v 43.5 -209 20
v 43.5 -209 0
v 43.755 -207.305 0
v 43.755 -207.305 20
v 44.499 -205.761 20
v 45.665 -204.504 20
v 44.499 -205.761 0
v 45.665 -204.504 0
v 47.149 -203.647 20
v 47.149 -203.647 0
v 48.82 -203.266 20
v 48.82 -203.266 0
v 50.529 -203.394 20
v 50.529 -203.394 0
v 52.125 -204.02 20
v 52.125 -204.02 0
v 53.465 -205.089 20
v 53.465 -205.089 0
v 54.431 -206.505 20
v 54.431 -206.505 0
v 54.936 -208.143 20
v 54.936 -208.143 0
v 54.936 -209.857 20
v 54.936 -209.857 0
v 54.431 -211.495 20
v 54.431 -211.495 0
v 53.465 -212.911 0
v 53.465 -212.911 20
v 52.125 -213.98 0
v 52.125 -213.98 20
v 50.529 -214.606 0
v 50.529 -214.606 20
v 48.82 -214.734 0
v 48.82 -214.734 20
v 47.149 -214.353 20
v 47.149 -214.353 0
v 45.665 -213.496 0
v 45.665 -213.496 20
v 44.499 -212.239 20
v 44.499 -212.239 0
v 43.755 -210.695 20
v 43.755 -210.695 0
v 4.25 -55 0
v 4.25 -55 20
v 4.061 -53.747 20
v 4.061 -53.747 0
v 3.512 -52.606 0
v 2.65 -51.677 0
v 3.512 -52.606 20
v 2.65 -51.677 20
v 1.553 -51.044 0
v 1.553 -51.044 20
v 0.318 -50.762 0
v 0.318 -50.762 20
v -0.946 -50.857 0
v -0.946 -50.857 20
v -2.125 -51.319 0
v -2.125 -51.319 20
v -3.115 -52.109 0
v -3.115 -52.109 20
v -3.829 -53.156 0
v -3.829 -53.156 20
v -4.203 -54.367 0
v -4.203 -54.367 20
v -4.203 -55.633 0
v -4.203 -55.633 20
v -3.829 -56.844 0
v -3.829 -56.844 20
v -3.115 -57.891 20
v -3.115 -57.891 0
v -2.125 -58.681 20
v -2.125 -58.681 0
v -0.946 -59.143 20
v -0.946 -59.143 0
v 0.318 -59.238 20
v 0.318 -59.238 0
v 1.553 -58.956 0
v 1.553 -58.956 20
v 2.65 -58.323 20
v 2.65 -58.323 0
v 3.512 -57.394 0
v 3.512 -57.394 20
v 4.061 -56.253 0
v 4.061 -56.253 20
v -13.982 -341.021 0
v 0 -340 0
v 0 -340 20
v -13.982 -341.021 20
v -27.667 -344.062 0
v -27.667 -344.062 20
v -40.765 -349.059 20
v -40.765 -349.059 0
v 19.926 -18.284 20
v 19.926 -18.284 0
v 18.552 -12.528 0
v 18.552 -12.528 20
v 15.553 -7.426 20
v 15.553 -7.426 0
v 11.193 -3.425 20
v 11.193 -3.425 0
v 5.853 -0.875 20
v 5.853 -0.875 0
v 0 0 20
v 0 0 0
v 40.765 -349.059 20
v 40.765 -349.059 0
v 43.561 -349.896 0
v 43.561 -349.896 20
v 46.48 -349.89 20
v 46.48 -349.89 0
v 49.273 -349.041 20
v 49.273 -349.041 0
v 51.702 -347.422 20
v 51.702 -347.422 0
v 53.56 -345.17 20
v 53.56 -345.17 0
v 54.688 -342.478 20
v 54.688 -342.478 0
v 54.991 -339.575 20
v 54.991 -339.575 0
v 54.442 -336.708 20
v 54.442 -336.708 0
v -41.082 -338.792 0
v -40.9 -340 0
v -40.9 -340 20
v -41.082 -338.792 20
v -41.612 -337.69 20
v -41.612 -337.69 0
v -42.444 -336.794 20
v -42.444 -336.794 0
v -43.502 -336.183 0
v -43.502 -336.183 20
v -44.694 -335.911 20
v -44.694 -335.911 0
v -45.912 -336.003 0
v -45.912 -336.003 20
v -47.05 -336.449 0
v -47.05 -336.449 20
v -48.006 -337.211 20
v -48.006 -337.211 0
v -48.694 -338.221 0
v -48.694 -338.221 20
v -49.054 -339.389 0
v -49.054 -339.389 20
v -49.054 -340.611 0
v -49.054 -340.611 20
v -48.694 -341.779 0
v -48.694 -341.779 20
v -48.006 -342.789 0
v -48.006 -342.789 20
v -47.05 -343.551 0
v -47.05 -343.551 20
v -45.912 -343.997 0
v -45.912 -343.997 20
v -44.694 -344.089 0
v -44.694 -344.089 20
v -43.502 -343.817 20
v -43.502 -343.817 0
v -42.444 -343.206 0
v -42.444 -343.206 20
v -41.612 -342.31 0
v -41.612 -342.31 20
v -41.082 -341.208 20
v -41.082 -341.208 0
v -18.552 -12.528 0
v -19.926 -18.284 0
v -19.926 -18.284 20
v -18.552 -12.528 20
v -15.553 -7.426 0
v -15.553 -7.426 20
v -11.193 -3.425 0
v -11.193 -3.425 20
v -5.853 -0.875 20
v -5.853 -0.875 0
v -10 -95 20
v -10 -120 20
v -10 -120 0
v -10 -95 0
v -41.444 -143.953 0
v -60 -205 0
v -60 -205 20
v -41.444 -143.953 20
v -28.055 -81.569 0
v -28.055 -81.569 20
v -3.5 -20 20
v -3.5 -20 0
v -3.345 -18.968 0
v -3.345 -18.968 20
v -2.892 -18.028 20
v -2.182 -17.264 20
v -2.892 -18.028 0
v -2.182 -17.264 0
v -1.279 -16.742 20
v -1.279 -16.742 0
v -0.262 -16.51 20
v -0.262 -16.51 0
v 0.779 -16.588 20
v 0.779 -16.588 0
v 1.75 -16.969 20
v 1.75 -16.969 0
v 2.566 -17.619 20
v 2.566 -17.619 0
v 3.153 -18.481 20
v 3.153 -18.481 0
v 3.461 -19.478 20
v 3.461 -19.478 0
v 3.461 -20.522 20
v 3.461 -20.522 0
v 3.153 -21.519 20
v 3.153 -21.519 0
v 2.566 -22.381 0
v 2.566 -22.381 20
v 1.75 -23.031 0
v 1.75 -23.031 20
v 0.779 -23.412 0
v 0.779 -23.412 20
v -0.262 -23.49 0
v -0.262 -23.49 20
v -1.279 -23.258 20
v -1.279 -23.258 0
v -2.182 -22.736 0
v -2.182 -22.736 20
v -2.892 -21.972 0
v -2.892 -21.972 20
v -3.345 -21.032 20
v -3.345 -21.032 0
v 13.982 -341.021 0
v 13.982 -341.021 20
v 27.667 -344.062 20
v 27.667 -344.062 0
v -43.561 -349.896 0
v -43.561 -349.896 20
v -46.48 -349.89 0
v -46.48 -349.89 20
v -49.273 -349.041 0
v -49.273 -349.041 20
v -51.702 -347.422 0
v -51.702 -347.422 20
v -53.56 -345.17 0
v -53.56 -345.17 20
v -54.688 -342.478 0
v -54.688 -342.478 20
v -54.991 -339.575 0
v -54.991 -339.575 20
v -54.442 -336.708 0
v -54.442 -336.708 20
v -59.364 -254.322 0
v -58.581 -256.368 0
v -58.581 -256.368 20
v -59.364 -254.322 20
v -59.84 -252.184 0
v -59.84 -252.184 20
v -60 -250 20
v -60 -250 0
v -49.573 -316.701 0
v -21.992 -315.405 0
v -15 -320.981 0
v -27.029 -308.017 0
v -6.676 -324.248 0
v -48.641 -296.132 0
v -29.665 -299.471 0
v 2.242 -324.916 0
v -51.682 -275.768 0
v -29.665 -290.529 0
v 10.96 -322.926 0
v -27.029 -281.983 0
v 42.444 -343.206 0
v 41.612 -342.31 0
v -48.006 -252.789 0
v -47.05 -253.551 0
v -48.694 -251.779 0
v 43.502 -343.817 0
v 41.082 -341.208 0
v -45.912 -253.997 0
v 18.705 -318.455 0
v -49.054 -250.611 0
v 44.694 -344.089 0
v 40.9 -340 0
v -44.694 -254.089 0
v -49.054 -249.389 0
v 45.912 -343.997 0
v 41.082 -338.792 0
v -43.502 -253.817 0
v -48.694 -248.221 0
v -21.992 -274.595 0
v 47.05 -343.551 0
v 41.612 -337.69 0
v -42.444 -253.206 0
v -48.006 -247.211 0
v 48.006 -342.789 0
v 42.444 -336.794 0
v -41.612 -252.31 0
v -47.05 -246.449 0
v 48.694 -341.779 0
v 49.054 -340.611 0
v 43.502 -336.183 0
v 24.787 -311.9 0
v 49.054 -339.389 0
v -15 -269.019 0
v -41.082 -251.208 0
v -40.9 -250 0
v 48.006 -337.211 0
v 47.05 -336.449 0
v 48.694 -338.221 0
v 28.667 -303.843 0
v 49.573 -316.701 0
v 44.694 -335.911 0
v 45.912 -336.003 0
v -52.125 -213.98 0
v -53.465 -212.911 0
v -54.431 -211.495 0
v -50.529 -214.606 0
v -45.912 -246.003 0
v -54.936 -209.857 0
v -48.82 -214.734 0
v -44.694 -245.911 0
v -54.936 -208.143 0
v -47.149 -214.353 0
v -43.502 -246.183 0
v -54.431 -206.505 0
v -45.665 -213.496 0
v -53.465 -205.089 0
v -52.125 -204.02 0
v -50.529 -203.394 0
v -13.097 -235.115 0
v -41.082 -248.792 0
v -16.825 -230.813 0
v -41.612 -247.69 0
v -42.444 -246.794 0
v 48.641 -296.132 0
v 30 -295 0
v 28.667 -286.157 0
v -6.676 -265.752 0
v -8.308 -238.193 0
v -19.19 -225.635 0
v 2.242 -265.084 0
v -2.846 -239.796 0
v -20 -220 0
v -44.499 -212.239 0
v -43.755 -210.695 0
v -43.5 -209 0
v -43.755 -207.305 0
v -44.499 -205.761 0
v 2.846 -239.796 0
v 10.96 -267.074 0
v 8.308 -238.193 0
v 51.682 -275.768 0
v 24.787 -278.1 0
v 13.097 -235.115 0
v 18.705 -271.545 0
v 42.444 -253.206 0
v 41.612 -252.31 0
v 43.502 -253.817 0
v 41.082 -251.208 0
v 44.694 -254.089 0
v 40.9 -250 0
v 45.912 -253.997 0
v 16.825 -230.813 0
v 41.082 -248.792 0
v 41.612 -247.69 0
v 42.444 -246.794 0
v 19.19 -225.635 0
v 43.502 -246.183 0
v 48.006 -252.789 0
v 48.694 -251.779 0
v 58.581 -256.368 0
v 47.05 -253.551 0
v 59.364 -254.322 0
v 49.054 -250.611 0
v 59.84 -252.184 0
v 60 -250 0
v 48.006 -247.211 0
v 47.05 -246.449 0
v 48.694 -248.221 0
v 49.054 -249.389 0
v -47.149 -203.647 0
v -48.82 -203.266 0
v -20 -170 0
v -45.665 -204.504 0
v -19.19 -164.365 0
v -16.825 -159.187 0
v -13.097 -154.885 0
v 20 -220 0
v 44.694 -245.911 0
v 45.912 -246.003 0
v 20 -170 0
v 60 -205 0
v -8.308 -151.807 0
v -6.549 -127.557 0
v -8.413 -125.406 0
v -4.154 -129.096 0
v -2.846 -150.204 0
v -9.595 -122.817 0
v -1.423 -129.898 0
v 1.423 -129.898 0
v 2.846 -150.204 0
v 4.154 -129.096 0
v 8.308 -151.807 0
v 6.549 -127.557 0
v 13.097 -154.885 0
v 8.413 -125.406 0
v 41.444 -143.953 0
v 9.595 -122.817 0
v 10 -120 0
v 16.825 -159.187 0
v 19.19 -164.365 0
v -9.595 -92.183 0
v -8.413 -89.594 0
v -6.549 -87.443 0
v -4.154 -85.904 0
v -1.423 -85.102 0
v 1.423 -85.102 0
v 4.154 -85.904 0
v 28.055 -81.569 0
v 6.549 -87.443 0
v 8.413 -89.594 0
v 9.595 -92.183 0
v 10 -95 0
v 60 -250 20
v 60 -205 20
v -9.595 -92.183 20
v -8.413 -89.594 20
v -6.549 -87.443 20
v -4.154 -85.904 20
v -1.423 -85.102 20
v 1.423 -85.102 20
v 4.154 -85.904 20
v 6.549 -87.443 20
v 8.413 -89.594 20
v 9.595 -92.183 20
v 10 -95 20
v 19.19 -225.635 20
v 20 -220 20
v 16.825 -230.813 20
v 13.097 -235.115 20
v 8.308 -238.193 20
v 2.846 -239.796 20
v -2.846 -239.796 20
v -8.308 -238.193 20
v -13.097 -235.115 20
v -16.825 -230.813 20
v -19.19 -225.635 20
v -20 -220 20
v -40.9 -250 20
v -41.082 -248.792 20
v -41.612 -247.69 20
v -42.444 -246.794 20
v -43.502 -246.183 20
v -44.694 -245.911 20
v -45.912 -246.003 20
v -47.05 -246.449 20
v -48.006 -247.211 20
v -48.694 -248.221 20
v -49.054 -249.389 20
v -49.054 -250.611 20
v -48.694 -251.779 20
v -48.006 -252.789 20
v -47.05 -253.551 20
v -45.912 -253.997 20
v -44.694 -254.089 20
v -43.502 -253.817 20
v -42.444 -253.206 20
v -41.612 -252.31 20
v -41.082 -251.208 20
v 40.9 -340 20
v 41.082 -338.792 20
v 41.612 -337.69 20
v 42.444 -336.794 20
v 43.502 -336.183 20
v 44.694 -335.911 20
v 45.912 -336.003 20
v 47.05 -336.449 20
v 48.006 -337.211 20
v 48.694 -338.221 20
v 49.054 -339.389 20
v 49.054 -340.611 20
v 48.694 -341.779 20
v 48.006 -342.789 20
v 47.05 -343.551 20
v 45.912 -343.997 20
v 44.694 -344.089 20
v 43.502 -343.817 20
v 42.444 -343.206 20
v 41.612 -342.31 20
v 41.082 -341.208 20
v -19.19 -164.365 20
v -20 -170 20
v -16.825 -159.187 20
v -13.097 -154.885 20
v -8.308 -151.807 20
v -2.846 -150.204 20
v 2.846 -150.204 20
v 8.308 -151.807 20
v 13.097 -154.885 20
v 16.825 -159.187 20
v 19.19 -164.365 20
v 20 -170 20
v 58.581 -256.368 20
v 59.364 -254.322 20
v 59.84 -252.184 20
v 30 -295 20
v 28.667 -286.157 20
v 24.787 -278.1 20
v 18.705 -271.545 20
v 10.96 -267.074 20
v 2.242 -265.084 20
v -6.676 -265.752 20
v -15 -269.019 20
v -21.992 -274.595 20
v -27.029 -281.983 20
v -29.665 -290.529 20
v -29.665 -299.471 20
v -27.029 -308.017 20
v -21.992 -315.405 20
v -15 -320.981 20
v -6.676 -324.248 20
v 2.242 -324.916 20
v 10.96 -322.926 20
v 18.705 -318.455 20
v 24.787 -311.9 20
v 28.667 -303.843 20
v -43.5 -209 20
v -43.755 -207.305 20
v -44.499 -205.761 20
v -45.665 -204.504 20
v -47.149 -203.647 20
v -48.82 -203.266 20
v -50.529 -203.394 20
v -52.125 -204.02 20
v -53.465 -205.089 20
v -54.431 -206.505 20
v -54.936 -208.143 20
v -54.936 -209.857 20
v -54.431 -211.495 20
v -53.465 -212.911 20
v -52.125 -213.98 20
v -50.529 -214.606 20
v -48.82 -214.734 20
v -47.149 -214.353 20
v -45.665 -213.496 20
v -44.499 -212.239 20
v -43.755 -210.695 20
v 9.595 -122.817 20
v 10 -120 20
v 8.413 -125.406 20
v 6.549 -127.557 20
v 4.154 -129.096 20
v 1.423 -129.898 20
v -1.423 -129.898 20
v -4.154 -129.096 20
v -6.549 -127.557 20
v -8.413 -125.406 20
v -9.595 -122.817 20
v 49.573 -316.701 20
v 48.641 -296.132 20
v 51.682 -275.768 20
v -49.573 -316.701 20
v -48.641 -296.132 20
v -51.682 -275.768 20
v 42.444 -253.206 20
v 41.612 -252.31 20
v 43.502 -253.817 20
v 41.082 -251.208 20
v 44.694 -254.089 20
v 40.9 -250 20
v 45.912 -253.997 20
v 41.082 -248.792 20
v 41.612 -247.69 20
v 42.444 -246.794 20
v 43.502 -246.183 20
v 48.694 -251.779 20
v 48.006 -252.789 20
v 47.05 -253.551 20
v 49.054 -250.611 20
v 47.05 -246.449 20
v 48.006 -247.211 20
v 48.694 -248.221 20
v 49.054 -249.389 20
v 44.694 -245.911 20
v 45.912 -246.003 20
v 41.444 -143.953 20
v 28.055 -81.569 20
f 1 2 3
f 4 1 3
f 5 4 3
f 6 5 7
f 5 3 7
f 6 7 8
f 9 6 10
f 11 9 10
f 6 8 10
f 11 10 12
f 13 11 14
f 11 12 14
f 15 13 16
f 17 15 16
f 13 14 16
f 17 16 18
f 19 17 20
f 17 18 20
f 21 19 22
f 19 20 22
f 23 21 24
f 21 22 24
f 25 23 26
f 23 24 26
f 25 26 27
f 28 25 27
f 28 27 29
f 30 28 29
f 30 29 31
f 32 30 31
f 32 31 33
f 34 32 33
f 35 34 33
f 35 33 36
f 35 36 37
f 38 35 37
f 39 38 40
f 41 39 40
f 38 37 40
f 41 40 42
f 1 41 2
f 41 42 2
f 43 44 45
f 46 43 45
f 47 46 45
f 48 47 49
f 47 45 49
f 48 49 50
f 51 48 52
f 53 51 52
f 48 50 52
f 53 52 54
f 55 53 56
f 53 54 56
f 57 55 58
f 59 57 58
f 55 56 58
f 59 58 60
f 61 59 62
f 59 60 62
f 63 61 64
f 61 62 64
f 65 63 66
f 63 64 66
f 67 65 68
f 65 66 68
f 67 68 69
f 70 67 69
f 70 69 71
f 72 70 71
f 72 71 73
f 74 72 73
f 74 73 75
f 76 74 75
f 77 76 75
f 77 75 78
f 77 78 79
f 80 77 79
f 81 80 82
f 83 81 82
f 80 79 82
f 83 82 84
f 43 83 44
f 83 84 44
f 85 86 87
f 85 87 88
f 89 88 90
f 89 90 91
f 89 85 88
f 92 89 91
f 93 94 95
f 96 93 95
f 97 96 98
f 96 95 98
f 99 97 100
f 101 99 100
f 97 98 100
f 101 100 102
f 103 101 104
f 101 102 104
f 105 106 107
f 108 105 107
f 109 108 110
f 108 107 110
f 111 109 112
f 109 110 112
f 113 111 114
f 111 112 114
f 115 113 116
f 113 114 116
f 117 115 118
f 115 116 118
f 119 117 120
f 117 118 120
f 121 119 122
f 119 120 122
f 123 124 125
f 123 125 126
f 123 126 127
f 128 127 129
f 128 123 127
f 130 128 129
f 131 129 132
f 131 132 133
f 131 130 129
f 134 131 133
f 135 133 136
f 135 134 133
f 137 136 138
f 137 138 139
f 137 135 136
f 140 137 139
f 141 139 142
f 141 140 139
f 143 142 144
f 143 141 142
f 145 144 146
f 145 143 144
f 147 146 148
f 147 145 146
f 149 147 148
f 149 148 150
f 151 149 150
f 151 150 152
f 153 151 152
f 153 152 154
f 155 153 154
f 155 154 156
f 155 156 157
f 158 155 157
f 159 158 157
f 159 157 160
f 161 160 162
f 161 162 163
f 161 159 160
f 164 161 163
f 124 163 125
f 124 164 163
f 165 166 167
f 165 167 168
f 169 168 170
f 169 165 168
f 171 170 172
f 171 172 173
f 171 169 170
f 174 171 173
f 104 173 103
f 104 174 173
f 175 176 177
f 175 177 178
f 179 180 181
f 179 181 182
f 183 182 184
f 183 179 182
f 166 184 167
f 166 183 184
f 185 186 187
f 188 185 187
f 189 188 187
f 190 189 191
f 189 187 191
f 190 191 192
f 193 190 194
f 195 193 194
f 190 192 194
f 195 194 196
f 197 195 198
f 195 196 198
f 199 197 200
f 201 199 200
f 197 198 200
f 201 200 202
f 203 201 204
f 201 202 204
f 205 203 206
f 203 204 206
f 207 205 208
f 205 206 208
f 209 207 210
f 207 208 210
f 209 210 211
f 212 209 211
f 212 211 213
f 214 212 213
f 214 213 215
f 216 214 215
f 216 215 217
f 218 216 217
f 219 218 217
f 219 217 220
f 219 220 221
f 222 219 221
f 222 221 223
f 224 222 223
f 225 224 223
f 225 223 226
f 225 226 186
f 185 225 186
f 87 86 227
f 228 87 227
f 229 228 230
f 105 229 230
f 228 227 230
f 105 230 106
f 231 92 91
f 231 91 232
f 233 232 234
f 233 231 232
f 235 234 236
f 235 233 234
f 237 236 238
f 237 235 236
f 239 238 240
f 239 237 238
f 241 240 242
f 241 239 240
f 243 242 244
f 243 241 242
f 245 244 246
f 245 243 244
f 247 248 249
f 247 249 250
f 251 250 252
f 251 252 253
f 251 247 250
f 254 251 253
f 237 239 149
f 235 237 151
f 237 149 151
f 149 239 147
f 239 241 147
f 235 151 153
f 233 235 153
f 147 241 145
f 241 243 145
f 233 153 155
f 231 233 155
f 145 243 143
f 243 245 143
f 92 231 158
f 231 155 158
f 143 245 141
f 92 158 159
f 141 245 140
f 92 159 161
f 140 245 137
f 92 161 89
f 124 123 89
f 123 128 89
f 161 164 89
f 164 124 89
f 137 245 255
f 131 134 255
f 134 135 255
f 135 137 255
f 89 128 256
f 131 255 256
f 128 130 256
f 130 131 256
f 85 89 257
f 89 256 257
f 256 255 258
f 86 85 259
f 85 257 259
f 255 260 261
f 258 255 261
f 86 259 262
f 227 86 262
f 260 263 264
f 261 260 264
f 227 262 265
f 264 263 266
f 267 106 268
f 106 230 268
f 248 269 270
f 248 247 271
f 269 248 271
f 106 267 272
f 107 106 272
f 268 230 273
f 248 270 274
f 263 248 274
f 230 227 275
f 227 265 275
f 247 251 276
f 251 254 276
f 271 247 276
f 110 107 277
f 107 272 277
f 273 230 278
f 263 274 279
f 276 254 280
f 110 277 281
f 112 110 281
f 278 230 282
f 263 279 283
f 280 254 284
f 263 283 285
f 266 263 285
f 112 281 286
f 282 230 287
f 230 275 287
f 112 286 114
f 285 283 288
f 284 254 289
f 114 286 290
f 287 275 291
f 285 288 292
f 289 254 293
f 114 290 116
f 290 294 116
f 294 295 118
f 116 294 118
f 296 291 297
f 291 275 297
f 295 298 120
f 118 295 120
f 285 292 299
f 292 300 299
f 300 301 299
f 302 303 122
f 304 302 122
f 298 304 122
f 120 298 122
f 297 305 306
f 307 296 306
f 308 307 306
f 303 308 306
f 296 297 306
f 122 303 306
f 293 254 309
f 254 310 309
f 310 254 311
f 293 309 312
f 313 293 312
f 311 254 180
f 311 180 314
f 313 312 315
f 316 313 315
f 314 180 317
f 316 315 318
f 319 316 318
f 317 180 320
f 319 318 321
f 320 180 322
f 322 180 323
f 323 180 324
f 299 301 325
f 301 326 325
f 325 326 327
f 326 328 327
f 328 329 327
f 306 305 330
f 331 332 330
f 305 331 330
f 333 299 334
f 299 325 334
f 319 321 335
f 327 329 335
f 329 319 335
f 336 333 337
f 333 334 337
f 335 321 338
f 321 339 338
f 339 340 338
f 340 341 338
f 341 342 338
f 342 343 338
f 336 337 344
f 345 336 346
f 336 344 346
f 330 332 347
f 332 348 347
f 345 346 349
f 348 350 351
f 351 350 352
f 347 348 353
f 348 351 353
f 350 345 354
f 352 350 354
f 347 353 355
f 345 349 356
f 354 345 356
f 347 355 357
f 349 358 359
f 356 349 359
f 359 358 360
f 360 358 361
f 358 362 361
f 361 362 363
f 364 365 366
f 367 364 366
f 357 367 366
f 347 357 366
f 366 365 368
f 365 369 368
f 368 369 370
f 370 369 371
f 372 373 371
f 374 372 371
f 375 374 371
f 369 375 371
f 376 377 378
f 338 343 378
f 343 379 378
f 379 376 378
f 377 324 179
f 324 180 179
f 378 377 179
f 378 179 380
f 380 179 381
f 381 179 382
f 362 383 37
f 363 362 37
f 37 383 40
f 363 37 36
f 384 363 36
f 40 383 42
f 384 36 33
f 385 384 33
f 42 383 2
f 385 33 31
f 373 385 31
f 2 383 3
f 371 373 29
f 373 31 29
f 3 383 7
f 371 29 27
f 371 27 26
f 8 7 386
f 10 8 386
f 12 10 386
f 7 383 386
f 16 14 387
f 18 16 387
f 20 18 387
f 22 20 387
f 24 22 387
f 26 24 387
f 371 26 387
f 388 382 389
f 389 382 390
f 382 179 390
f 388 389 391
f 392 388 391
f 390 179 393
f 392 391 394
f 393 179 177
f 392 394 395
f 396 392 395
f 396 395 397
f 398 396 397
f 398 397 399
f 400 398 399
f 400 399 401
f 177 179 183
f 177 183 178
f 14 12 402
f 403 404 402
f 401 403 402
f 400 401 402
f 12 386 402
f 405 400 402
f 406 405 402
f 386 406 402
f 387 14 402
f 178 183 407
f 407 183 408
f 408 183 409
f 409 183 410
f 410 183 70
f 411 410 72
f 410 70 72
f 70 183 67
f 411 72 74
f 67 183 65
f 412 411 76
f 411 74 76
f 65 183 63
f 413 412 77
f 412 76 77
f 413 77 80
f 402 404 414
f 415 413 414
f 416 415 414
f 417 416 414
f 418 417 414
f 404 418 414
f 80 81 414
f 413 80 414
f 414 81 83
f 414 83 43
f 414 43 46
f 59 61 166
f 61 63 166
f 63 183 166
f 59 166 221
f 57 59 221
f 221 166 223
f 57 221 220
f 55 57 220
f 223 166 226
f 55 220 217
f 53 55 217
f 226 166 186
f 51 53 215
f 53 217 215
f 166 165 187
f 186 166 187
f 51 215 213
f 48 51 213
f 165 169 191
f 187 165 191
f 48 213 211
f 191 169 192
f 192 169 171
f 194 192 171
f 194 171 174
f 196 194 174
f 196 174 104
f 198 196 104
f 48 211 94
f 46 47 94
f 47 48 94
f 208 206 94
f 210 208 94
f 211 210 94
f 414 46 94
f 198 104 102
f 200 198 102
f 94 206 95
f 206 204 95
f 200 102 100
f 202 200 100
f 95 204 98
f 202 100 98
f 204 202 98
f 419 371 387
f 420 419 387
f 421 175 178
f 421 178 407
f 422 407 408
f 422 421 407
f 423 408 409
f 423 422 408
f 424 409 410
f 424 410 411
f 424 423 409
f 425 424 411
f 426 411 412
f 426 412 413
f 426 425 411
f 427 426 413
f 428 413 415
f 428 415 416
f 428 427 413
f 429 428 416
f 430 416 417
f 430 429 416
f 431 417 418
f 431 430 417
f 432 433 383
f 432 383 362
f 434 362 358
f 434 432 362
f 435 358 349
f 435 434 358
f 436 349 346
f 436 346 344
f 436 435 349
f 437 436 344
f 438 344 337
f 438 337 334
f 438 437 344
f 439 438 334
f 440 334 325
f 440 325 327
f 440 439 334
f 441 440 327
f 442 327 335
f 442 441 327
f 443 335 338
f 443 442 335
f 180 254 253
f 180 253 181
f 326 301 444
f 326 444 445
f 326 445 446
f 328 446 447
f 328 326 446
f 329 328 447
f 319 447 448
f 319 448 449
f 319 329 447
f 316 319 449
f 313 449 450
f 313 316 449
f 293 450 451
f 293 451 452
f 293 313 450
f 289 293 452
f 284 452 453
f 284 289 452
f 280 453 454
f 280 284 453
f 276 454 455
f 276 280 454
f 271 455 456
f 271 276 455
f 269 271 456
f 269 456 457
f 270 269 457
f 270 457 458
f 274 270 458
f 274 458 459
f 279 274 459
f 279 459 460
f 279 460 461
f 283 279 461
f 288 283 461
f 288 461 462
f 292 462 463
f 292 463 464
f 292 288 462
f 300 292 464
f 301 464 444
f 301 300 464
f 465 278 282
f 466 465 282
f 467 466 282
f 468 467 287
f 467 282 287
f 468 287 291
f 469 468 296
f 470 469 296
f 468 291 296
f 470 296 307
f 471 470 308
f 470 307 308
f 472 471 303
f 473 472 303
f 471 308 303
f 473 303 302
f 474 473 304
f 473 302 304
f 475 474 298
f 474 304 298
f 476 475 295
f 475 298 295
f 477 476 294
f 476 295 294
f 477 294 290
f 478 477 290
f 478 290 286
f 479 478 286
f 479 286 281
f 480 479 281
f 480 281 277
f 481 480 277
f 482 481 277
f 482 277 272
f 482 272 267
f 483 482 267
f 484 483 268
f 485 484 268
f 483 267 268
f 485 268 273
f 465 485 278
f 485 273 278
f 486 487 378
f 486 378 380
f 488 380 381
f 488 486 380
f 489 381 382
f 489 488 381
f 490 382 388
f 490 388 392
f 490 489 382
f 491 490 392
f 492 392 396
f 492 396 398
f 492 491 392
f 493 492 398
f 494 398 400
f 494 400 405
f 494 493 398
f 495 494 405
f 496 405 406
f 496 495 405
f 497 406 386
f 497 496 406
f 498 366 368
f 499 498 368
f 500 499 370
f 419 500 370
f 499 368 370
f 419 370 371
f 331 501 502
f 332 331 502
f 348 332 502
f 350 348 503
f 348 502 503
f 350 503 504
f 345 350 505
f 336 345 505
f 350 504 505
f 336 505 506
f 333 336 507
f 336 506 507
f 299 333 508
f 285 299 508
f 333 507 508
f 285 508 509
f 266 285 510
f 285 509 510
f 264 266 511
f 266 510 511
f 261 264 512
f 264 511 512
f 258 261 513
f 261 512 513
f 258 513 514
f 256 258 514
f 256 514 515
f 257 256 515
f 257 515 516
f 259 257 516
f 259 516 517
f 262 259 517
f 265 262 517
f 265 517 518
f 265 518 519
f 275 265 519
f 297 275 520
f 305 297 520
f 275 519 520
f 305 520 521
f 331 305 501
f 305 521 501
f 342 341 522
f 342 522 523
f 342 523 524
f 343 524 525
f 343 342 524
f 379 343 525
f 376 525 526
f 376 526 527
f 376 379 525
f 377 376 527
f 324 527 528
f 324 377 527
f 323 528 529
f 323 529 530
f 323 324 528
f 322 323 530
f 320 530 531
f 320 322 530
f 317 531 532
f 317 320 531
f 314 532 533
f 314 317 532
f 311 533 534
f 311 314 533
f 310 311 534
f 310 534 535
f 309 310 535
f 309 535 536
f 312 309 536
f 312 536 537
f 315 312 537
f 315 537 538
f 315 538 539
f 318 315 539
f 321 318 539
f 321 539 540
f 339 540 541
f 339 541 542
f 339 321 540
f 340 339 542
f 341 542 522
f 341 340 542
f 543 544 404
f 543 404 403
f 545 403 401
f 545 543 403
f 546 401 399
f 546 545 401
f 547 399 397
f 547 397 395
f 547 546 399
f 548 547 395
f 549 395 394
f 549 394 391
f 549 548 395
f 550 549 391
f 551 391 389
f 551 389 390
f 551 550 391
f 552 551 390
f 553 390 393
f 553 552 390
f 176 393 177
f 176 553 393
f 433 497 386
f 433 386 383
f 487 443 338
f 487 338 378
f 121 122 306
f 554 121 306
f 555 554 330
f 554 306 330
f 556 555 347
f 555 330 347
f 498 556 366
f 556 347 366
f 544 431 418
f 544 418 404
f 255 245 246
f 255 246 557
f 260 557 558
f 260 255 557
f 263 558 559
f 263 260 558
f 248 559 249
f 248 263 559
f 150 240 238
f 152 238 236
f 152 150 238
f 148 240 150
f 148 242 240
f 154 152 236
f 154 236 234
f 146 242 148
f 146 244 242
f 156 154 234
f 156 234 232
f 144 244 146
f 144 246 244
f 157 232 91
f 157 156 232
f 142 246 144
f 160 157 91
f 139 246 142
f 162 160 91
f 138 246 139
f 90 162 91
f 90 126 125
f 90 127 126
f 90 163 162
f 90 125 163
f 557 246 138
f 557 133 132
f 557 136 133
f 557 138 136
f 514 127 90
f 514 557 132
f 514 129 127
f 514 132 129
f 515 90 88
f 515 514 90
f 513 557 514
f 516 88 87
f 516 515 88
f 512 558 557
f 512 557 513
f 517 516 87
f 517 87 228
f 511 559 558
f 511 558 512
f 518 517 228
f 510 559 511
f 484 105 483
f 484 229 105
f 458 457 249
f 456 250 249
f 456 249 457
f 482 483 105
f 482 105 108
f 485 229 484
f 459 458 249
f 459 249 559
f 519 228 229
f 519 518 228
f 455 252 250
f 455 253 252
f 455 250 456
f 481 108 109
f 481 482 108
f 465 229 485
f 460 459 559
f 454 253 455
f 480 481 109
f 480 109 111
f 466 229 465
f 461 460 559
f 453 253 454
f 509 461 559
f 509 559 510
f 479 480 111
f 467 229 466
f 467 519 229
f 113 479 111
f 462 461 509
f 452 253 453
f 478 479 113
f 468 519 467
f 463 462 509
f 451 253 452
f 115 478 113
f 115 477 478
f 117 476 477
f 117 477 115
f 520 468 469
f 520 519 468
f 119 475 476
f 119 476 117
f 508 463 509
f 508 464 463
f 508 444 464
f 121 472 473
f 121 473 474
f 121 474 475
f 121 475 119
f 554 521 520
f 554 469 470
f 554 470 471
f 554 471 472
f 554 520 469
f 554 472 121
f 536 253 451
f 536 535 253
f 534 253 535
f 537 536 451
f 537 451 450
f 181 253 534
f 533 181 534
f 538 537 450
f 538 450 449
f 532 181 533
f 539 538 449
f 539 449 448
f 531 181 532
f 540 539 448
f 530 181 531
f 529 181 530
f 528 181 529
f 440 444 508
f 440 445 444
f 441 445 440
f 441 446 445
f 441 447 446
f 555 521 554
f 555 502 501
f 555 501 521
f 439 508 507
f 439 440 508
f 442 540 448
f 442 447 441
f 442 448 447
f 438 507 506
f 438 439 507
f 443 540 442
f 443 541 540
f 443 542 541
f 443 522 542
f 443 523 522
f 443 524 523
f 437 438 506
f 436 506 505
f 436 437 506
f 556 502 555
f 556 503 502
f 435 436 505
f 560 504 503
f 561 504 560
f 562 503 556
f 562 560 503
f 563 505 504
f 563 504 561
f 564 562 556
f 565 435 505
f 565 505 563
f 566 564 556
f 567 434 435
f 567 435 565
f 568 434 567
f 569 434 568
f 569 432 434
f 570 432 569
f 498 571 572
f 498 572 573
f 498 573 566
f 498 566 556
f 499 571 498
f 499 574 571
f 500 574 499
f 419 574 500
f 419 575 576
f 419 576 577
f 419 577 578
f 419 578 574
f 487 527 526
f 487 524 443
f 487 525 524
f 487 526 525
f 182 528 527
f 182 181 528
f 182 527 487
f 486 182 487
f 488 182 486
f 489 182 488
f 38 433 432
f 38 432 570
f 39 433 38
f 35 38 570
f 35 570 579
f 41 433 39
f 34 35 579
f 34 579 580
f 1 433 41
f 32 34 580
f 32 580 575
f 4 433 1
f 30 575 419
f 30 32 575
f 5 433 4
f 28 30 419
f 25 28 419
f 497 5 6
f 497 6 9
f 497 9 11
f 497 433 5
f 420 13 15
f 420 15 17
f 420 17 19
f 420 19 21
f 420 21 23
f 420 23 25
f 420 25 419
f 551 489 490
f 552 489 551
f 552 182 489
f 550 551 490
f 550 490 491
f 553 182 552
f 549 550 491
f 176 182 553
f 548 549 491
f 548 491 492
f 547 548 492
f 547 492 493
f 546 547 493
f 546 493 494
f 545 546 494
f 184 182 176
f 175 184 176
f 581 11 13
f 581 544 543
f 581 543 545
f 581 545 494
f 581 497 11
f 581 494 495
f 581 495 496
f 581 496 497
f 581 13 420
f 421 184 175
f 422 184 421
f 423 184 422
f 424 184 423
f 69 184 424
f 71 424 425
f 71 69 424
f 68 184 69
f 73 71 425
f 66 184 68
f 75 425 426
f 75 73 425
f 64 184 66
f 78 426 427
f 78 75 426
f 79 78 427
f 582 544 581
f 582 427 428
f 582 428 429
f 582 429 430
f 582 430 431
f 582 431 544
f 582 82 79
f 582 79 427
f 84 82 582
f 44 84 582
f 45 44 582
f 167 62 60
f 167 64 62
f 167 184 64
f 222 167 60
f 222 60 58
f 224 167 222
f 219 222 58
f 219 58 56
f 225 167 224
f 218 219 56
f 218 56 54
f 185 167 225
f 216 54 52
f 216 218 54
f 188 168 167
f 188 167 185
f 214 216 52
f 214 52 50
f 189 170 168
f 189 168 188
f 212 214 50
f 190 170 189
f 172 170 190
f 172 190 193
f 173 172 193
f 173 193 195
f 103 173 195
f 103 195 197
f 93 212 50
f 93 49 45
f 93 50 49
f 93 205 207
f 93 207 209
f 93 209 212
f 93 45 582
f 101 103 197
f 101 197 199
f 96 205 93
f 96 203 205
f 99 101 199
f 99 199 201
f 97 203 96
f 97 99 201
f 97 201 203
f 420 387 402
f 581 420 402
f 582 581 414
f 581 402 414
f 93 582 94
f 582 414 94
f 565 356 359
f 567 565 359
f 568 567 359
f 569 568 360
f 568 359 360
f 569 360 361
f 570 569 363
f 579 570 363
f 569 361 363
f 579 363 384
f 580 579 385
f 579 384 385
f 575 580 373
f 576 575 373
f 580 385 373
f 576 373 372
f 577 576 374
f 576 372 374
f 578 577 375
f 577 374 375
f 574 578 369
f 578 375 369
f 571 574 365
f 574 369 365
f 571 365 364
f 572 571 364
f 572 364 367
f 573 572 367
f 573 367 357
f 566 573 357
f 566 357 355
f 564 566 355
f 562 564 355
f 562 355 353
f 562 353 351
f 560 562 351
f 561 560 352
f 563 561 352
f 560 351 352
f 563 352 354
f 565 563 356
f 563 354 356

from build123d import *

# Parameters (mm, degrees)
ESQUISSE1_R             = 4.1
ESQUISSE1_R_2           = 5.75
BOSS_EXTRU_1_DEPTH      = 20
ESQUISSE2_R             = 30
ENL_V_MAT_EXTRU_1_DEPTH = 20
ENL_V_MAT_EXTRU_2_DEPTH = 20
ENL_V_MAT_EXTRU_3_DEPTH = 20
ESQUISSE5_R             = 4.25
ENL_V_MAT_EXTRU_4_DEPTH = 20
TROU_TARAUD_M8X1_01_D   = 7


with BuildPart() as part:
    # Esquisse1 → Boss.-Extru.1 (new body)
    with BuildSketch(Plane.XY):
        with BuildLine():
            Line((0, 0), (0, -340))
            ThreePointArc((0, -340), (-20.879556565, -342.291995457), (-40.764705882, -349.058823529))
            ThreePointArc((-40.764705882, -349.058823529), (-51.70200076, -347.421804754), (-54.442463892, -336.707603359))
            ThreePointArc((-54.442463892, -336.707603359), (-48.641150346, -296.132285263), (-58.581232197, -256.367898556))
            ThreePointArc((-58.581232197, -256.367898556), (-59.641012311, -253.262017554), (-60, -250))
            Line((-60, -250), (-60, -205))
            ThreePointArc((-60, -205), (-34.0967157, -112.901065178), (-19.926246382, -18.283985684))
            ThreePointArc((-19.926246382, -18.283985684), (-13.521828901, -5.263645527), (0, 0))
        make_face()
        with Locations((-45, -340)):
            Circle(ESQUISSE1_R, mode=Mode.SUBTRACT)
        with Locations((-45, -250)):
            Circle(ESQUISSE1_R, mode=Mode.SUBTRACT)
        with Locations((-49.25, -209)):
            Circle(ESQUISSE1_R_2, mode=Mode.SUBTRACT)
    boss_extru_1 = extrude(amount=BOSS_EXTRU_1_DEPTH)

    # Symétrie1: Boss.-Extru.1 across plane
    add(boss_extru_1.mirror(Plane(origin=(0, 0, 20), x_dir=(0, 0, 1), z_dir=(-1, 0, 0))))

    # Esquisse2 → Enlèv. mat.-Extru.1 (cut)
    with BuildSketch(Plane.XY.offset(20)):
        with Locations((0, -295)):
            Circle(ESQUISSE2_R)
    extrude(amount=-ENL_V_MAT_EXTRU_1_DEPTH, mode=Mode.SUBTRACT)

    # Esquisse3 → Enlèv. mat.-Extru.2 (cut)
    with BuildSketch(Plane.XY.offset(20)):
        with BuildLine():
            Line((-20, -220), (-20, -170))
            ThreePointArc((-20, -170), (0, -150), (20, -170))
            Line((20, -170), (20, -220))
            ThreePointArc((20, -220), (0, -240), (-20, -220))
        make_face()
    extrude(amount=-ENL_V_MAT_EXTRU_2_DEPTH, mode=Mode.SUBTRACT)

    # Esquisse4 → Enlèv. mat.-Extru.3 (cut)
    with BuildSketch(Plane.XY.offset(20)):
        with BuildLine():
            Line((-10, -120), (-10, -95))
            ThreePointArc((-10, -95), (0, -85), (10, -95))
            Line((10, -95), (10, -120))
            ThreePointArc((10, -120), (0, -130), (-10, -120))
        make_face()
    extrude(amount=-ENL_V_MAT_EXTRU_3_DEPTH, mode=Mode.SUBTRACT)

    # Esquisse5 → Enlèv. mat.-Extru.4 (cut)
    with BuildSketch(Plane.XY.offset(20)):
        with Locations((0, -55)):
            Circle(ESQUISSE5_R)
    extrude(amount=-ENL_V_MAT_EXTRU_4_DEPTH, mode=Mode.SUBTRACT)

    # Trou taraudé M8x1.01 (through all)
    with Locations(Plane.XY.offset(20)):
        with Locations((0, -20)):
            Hole(TROU_TARAUD_M8X1_01_D / 2)


solid = part.part
